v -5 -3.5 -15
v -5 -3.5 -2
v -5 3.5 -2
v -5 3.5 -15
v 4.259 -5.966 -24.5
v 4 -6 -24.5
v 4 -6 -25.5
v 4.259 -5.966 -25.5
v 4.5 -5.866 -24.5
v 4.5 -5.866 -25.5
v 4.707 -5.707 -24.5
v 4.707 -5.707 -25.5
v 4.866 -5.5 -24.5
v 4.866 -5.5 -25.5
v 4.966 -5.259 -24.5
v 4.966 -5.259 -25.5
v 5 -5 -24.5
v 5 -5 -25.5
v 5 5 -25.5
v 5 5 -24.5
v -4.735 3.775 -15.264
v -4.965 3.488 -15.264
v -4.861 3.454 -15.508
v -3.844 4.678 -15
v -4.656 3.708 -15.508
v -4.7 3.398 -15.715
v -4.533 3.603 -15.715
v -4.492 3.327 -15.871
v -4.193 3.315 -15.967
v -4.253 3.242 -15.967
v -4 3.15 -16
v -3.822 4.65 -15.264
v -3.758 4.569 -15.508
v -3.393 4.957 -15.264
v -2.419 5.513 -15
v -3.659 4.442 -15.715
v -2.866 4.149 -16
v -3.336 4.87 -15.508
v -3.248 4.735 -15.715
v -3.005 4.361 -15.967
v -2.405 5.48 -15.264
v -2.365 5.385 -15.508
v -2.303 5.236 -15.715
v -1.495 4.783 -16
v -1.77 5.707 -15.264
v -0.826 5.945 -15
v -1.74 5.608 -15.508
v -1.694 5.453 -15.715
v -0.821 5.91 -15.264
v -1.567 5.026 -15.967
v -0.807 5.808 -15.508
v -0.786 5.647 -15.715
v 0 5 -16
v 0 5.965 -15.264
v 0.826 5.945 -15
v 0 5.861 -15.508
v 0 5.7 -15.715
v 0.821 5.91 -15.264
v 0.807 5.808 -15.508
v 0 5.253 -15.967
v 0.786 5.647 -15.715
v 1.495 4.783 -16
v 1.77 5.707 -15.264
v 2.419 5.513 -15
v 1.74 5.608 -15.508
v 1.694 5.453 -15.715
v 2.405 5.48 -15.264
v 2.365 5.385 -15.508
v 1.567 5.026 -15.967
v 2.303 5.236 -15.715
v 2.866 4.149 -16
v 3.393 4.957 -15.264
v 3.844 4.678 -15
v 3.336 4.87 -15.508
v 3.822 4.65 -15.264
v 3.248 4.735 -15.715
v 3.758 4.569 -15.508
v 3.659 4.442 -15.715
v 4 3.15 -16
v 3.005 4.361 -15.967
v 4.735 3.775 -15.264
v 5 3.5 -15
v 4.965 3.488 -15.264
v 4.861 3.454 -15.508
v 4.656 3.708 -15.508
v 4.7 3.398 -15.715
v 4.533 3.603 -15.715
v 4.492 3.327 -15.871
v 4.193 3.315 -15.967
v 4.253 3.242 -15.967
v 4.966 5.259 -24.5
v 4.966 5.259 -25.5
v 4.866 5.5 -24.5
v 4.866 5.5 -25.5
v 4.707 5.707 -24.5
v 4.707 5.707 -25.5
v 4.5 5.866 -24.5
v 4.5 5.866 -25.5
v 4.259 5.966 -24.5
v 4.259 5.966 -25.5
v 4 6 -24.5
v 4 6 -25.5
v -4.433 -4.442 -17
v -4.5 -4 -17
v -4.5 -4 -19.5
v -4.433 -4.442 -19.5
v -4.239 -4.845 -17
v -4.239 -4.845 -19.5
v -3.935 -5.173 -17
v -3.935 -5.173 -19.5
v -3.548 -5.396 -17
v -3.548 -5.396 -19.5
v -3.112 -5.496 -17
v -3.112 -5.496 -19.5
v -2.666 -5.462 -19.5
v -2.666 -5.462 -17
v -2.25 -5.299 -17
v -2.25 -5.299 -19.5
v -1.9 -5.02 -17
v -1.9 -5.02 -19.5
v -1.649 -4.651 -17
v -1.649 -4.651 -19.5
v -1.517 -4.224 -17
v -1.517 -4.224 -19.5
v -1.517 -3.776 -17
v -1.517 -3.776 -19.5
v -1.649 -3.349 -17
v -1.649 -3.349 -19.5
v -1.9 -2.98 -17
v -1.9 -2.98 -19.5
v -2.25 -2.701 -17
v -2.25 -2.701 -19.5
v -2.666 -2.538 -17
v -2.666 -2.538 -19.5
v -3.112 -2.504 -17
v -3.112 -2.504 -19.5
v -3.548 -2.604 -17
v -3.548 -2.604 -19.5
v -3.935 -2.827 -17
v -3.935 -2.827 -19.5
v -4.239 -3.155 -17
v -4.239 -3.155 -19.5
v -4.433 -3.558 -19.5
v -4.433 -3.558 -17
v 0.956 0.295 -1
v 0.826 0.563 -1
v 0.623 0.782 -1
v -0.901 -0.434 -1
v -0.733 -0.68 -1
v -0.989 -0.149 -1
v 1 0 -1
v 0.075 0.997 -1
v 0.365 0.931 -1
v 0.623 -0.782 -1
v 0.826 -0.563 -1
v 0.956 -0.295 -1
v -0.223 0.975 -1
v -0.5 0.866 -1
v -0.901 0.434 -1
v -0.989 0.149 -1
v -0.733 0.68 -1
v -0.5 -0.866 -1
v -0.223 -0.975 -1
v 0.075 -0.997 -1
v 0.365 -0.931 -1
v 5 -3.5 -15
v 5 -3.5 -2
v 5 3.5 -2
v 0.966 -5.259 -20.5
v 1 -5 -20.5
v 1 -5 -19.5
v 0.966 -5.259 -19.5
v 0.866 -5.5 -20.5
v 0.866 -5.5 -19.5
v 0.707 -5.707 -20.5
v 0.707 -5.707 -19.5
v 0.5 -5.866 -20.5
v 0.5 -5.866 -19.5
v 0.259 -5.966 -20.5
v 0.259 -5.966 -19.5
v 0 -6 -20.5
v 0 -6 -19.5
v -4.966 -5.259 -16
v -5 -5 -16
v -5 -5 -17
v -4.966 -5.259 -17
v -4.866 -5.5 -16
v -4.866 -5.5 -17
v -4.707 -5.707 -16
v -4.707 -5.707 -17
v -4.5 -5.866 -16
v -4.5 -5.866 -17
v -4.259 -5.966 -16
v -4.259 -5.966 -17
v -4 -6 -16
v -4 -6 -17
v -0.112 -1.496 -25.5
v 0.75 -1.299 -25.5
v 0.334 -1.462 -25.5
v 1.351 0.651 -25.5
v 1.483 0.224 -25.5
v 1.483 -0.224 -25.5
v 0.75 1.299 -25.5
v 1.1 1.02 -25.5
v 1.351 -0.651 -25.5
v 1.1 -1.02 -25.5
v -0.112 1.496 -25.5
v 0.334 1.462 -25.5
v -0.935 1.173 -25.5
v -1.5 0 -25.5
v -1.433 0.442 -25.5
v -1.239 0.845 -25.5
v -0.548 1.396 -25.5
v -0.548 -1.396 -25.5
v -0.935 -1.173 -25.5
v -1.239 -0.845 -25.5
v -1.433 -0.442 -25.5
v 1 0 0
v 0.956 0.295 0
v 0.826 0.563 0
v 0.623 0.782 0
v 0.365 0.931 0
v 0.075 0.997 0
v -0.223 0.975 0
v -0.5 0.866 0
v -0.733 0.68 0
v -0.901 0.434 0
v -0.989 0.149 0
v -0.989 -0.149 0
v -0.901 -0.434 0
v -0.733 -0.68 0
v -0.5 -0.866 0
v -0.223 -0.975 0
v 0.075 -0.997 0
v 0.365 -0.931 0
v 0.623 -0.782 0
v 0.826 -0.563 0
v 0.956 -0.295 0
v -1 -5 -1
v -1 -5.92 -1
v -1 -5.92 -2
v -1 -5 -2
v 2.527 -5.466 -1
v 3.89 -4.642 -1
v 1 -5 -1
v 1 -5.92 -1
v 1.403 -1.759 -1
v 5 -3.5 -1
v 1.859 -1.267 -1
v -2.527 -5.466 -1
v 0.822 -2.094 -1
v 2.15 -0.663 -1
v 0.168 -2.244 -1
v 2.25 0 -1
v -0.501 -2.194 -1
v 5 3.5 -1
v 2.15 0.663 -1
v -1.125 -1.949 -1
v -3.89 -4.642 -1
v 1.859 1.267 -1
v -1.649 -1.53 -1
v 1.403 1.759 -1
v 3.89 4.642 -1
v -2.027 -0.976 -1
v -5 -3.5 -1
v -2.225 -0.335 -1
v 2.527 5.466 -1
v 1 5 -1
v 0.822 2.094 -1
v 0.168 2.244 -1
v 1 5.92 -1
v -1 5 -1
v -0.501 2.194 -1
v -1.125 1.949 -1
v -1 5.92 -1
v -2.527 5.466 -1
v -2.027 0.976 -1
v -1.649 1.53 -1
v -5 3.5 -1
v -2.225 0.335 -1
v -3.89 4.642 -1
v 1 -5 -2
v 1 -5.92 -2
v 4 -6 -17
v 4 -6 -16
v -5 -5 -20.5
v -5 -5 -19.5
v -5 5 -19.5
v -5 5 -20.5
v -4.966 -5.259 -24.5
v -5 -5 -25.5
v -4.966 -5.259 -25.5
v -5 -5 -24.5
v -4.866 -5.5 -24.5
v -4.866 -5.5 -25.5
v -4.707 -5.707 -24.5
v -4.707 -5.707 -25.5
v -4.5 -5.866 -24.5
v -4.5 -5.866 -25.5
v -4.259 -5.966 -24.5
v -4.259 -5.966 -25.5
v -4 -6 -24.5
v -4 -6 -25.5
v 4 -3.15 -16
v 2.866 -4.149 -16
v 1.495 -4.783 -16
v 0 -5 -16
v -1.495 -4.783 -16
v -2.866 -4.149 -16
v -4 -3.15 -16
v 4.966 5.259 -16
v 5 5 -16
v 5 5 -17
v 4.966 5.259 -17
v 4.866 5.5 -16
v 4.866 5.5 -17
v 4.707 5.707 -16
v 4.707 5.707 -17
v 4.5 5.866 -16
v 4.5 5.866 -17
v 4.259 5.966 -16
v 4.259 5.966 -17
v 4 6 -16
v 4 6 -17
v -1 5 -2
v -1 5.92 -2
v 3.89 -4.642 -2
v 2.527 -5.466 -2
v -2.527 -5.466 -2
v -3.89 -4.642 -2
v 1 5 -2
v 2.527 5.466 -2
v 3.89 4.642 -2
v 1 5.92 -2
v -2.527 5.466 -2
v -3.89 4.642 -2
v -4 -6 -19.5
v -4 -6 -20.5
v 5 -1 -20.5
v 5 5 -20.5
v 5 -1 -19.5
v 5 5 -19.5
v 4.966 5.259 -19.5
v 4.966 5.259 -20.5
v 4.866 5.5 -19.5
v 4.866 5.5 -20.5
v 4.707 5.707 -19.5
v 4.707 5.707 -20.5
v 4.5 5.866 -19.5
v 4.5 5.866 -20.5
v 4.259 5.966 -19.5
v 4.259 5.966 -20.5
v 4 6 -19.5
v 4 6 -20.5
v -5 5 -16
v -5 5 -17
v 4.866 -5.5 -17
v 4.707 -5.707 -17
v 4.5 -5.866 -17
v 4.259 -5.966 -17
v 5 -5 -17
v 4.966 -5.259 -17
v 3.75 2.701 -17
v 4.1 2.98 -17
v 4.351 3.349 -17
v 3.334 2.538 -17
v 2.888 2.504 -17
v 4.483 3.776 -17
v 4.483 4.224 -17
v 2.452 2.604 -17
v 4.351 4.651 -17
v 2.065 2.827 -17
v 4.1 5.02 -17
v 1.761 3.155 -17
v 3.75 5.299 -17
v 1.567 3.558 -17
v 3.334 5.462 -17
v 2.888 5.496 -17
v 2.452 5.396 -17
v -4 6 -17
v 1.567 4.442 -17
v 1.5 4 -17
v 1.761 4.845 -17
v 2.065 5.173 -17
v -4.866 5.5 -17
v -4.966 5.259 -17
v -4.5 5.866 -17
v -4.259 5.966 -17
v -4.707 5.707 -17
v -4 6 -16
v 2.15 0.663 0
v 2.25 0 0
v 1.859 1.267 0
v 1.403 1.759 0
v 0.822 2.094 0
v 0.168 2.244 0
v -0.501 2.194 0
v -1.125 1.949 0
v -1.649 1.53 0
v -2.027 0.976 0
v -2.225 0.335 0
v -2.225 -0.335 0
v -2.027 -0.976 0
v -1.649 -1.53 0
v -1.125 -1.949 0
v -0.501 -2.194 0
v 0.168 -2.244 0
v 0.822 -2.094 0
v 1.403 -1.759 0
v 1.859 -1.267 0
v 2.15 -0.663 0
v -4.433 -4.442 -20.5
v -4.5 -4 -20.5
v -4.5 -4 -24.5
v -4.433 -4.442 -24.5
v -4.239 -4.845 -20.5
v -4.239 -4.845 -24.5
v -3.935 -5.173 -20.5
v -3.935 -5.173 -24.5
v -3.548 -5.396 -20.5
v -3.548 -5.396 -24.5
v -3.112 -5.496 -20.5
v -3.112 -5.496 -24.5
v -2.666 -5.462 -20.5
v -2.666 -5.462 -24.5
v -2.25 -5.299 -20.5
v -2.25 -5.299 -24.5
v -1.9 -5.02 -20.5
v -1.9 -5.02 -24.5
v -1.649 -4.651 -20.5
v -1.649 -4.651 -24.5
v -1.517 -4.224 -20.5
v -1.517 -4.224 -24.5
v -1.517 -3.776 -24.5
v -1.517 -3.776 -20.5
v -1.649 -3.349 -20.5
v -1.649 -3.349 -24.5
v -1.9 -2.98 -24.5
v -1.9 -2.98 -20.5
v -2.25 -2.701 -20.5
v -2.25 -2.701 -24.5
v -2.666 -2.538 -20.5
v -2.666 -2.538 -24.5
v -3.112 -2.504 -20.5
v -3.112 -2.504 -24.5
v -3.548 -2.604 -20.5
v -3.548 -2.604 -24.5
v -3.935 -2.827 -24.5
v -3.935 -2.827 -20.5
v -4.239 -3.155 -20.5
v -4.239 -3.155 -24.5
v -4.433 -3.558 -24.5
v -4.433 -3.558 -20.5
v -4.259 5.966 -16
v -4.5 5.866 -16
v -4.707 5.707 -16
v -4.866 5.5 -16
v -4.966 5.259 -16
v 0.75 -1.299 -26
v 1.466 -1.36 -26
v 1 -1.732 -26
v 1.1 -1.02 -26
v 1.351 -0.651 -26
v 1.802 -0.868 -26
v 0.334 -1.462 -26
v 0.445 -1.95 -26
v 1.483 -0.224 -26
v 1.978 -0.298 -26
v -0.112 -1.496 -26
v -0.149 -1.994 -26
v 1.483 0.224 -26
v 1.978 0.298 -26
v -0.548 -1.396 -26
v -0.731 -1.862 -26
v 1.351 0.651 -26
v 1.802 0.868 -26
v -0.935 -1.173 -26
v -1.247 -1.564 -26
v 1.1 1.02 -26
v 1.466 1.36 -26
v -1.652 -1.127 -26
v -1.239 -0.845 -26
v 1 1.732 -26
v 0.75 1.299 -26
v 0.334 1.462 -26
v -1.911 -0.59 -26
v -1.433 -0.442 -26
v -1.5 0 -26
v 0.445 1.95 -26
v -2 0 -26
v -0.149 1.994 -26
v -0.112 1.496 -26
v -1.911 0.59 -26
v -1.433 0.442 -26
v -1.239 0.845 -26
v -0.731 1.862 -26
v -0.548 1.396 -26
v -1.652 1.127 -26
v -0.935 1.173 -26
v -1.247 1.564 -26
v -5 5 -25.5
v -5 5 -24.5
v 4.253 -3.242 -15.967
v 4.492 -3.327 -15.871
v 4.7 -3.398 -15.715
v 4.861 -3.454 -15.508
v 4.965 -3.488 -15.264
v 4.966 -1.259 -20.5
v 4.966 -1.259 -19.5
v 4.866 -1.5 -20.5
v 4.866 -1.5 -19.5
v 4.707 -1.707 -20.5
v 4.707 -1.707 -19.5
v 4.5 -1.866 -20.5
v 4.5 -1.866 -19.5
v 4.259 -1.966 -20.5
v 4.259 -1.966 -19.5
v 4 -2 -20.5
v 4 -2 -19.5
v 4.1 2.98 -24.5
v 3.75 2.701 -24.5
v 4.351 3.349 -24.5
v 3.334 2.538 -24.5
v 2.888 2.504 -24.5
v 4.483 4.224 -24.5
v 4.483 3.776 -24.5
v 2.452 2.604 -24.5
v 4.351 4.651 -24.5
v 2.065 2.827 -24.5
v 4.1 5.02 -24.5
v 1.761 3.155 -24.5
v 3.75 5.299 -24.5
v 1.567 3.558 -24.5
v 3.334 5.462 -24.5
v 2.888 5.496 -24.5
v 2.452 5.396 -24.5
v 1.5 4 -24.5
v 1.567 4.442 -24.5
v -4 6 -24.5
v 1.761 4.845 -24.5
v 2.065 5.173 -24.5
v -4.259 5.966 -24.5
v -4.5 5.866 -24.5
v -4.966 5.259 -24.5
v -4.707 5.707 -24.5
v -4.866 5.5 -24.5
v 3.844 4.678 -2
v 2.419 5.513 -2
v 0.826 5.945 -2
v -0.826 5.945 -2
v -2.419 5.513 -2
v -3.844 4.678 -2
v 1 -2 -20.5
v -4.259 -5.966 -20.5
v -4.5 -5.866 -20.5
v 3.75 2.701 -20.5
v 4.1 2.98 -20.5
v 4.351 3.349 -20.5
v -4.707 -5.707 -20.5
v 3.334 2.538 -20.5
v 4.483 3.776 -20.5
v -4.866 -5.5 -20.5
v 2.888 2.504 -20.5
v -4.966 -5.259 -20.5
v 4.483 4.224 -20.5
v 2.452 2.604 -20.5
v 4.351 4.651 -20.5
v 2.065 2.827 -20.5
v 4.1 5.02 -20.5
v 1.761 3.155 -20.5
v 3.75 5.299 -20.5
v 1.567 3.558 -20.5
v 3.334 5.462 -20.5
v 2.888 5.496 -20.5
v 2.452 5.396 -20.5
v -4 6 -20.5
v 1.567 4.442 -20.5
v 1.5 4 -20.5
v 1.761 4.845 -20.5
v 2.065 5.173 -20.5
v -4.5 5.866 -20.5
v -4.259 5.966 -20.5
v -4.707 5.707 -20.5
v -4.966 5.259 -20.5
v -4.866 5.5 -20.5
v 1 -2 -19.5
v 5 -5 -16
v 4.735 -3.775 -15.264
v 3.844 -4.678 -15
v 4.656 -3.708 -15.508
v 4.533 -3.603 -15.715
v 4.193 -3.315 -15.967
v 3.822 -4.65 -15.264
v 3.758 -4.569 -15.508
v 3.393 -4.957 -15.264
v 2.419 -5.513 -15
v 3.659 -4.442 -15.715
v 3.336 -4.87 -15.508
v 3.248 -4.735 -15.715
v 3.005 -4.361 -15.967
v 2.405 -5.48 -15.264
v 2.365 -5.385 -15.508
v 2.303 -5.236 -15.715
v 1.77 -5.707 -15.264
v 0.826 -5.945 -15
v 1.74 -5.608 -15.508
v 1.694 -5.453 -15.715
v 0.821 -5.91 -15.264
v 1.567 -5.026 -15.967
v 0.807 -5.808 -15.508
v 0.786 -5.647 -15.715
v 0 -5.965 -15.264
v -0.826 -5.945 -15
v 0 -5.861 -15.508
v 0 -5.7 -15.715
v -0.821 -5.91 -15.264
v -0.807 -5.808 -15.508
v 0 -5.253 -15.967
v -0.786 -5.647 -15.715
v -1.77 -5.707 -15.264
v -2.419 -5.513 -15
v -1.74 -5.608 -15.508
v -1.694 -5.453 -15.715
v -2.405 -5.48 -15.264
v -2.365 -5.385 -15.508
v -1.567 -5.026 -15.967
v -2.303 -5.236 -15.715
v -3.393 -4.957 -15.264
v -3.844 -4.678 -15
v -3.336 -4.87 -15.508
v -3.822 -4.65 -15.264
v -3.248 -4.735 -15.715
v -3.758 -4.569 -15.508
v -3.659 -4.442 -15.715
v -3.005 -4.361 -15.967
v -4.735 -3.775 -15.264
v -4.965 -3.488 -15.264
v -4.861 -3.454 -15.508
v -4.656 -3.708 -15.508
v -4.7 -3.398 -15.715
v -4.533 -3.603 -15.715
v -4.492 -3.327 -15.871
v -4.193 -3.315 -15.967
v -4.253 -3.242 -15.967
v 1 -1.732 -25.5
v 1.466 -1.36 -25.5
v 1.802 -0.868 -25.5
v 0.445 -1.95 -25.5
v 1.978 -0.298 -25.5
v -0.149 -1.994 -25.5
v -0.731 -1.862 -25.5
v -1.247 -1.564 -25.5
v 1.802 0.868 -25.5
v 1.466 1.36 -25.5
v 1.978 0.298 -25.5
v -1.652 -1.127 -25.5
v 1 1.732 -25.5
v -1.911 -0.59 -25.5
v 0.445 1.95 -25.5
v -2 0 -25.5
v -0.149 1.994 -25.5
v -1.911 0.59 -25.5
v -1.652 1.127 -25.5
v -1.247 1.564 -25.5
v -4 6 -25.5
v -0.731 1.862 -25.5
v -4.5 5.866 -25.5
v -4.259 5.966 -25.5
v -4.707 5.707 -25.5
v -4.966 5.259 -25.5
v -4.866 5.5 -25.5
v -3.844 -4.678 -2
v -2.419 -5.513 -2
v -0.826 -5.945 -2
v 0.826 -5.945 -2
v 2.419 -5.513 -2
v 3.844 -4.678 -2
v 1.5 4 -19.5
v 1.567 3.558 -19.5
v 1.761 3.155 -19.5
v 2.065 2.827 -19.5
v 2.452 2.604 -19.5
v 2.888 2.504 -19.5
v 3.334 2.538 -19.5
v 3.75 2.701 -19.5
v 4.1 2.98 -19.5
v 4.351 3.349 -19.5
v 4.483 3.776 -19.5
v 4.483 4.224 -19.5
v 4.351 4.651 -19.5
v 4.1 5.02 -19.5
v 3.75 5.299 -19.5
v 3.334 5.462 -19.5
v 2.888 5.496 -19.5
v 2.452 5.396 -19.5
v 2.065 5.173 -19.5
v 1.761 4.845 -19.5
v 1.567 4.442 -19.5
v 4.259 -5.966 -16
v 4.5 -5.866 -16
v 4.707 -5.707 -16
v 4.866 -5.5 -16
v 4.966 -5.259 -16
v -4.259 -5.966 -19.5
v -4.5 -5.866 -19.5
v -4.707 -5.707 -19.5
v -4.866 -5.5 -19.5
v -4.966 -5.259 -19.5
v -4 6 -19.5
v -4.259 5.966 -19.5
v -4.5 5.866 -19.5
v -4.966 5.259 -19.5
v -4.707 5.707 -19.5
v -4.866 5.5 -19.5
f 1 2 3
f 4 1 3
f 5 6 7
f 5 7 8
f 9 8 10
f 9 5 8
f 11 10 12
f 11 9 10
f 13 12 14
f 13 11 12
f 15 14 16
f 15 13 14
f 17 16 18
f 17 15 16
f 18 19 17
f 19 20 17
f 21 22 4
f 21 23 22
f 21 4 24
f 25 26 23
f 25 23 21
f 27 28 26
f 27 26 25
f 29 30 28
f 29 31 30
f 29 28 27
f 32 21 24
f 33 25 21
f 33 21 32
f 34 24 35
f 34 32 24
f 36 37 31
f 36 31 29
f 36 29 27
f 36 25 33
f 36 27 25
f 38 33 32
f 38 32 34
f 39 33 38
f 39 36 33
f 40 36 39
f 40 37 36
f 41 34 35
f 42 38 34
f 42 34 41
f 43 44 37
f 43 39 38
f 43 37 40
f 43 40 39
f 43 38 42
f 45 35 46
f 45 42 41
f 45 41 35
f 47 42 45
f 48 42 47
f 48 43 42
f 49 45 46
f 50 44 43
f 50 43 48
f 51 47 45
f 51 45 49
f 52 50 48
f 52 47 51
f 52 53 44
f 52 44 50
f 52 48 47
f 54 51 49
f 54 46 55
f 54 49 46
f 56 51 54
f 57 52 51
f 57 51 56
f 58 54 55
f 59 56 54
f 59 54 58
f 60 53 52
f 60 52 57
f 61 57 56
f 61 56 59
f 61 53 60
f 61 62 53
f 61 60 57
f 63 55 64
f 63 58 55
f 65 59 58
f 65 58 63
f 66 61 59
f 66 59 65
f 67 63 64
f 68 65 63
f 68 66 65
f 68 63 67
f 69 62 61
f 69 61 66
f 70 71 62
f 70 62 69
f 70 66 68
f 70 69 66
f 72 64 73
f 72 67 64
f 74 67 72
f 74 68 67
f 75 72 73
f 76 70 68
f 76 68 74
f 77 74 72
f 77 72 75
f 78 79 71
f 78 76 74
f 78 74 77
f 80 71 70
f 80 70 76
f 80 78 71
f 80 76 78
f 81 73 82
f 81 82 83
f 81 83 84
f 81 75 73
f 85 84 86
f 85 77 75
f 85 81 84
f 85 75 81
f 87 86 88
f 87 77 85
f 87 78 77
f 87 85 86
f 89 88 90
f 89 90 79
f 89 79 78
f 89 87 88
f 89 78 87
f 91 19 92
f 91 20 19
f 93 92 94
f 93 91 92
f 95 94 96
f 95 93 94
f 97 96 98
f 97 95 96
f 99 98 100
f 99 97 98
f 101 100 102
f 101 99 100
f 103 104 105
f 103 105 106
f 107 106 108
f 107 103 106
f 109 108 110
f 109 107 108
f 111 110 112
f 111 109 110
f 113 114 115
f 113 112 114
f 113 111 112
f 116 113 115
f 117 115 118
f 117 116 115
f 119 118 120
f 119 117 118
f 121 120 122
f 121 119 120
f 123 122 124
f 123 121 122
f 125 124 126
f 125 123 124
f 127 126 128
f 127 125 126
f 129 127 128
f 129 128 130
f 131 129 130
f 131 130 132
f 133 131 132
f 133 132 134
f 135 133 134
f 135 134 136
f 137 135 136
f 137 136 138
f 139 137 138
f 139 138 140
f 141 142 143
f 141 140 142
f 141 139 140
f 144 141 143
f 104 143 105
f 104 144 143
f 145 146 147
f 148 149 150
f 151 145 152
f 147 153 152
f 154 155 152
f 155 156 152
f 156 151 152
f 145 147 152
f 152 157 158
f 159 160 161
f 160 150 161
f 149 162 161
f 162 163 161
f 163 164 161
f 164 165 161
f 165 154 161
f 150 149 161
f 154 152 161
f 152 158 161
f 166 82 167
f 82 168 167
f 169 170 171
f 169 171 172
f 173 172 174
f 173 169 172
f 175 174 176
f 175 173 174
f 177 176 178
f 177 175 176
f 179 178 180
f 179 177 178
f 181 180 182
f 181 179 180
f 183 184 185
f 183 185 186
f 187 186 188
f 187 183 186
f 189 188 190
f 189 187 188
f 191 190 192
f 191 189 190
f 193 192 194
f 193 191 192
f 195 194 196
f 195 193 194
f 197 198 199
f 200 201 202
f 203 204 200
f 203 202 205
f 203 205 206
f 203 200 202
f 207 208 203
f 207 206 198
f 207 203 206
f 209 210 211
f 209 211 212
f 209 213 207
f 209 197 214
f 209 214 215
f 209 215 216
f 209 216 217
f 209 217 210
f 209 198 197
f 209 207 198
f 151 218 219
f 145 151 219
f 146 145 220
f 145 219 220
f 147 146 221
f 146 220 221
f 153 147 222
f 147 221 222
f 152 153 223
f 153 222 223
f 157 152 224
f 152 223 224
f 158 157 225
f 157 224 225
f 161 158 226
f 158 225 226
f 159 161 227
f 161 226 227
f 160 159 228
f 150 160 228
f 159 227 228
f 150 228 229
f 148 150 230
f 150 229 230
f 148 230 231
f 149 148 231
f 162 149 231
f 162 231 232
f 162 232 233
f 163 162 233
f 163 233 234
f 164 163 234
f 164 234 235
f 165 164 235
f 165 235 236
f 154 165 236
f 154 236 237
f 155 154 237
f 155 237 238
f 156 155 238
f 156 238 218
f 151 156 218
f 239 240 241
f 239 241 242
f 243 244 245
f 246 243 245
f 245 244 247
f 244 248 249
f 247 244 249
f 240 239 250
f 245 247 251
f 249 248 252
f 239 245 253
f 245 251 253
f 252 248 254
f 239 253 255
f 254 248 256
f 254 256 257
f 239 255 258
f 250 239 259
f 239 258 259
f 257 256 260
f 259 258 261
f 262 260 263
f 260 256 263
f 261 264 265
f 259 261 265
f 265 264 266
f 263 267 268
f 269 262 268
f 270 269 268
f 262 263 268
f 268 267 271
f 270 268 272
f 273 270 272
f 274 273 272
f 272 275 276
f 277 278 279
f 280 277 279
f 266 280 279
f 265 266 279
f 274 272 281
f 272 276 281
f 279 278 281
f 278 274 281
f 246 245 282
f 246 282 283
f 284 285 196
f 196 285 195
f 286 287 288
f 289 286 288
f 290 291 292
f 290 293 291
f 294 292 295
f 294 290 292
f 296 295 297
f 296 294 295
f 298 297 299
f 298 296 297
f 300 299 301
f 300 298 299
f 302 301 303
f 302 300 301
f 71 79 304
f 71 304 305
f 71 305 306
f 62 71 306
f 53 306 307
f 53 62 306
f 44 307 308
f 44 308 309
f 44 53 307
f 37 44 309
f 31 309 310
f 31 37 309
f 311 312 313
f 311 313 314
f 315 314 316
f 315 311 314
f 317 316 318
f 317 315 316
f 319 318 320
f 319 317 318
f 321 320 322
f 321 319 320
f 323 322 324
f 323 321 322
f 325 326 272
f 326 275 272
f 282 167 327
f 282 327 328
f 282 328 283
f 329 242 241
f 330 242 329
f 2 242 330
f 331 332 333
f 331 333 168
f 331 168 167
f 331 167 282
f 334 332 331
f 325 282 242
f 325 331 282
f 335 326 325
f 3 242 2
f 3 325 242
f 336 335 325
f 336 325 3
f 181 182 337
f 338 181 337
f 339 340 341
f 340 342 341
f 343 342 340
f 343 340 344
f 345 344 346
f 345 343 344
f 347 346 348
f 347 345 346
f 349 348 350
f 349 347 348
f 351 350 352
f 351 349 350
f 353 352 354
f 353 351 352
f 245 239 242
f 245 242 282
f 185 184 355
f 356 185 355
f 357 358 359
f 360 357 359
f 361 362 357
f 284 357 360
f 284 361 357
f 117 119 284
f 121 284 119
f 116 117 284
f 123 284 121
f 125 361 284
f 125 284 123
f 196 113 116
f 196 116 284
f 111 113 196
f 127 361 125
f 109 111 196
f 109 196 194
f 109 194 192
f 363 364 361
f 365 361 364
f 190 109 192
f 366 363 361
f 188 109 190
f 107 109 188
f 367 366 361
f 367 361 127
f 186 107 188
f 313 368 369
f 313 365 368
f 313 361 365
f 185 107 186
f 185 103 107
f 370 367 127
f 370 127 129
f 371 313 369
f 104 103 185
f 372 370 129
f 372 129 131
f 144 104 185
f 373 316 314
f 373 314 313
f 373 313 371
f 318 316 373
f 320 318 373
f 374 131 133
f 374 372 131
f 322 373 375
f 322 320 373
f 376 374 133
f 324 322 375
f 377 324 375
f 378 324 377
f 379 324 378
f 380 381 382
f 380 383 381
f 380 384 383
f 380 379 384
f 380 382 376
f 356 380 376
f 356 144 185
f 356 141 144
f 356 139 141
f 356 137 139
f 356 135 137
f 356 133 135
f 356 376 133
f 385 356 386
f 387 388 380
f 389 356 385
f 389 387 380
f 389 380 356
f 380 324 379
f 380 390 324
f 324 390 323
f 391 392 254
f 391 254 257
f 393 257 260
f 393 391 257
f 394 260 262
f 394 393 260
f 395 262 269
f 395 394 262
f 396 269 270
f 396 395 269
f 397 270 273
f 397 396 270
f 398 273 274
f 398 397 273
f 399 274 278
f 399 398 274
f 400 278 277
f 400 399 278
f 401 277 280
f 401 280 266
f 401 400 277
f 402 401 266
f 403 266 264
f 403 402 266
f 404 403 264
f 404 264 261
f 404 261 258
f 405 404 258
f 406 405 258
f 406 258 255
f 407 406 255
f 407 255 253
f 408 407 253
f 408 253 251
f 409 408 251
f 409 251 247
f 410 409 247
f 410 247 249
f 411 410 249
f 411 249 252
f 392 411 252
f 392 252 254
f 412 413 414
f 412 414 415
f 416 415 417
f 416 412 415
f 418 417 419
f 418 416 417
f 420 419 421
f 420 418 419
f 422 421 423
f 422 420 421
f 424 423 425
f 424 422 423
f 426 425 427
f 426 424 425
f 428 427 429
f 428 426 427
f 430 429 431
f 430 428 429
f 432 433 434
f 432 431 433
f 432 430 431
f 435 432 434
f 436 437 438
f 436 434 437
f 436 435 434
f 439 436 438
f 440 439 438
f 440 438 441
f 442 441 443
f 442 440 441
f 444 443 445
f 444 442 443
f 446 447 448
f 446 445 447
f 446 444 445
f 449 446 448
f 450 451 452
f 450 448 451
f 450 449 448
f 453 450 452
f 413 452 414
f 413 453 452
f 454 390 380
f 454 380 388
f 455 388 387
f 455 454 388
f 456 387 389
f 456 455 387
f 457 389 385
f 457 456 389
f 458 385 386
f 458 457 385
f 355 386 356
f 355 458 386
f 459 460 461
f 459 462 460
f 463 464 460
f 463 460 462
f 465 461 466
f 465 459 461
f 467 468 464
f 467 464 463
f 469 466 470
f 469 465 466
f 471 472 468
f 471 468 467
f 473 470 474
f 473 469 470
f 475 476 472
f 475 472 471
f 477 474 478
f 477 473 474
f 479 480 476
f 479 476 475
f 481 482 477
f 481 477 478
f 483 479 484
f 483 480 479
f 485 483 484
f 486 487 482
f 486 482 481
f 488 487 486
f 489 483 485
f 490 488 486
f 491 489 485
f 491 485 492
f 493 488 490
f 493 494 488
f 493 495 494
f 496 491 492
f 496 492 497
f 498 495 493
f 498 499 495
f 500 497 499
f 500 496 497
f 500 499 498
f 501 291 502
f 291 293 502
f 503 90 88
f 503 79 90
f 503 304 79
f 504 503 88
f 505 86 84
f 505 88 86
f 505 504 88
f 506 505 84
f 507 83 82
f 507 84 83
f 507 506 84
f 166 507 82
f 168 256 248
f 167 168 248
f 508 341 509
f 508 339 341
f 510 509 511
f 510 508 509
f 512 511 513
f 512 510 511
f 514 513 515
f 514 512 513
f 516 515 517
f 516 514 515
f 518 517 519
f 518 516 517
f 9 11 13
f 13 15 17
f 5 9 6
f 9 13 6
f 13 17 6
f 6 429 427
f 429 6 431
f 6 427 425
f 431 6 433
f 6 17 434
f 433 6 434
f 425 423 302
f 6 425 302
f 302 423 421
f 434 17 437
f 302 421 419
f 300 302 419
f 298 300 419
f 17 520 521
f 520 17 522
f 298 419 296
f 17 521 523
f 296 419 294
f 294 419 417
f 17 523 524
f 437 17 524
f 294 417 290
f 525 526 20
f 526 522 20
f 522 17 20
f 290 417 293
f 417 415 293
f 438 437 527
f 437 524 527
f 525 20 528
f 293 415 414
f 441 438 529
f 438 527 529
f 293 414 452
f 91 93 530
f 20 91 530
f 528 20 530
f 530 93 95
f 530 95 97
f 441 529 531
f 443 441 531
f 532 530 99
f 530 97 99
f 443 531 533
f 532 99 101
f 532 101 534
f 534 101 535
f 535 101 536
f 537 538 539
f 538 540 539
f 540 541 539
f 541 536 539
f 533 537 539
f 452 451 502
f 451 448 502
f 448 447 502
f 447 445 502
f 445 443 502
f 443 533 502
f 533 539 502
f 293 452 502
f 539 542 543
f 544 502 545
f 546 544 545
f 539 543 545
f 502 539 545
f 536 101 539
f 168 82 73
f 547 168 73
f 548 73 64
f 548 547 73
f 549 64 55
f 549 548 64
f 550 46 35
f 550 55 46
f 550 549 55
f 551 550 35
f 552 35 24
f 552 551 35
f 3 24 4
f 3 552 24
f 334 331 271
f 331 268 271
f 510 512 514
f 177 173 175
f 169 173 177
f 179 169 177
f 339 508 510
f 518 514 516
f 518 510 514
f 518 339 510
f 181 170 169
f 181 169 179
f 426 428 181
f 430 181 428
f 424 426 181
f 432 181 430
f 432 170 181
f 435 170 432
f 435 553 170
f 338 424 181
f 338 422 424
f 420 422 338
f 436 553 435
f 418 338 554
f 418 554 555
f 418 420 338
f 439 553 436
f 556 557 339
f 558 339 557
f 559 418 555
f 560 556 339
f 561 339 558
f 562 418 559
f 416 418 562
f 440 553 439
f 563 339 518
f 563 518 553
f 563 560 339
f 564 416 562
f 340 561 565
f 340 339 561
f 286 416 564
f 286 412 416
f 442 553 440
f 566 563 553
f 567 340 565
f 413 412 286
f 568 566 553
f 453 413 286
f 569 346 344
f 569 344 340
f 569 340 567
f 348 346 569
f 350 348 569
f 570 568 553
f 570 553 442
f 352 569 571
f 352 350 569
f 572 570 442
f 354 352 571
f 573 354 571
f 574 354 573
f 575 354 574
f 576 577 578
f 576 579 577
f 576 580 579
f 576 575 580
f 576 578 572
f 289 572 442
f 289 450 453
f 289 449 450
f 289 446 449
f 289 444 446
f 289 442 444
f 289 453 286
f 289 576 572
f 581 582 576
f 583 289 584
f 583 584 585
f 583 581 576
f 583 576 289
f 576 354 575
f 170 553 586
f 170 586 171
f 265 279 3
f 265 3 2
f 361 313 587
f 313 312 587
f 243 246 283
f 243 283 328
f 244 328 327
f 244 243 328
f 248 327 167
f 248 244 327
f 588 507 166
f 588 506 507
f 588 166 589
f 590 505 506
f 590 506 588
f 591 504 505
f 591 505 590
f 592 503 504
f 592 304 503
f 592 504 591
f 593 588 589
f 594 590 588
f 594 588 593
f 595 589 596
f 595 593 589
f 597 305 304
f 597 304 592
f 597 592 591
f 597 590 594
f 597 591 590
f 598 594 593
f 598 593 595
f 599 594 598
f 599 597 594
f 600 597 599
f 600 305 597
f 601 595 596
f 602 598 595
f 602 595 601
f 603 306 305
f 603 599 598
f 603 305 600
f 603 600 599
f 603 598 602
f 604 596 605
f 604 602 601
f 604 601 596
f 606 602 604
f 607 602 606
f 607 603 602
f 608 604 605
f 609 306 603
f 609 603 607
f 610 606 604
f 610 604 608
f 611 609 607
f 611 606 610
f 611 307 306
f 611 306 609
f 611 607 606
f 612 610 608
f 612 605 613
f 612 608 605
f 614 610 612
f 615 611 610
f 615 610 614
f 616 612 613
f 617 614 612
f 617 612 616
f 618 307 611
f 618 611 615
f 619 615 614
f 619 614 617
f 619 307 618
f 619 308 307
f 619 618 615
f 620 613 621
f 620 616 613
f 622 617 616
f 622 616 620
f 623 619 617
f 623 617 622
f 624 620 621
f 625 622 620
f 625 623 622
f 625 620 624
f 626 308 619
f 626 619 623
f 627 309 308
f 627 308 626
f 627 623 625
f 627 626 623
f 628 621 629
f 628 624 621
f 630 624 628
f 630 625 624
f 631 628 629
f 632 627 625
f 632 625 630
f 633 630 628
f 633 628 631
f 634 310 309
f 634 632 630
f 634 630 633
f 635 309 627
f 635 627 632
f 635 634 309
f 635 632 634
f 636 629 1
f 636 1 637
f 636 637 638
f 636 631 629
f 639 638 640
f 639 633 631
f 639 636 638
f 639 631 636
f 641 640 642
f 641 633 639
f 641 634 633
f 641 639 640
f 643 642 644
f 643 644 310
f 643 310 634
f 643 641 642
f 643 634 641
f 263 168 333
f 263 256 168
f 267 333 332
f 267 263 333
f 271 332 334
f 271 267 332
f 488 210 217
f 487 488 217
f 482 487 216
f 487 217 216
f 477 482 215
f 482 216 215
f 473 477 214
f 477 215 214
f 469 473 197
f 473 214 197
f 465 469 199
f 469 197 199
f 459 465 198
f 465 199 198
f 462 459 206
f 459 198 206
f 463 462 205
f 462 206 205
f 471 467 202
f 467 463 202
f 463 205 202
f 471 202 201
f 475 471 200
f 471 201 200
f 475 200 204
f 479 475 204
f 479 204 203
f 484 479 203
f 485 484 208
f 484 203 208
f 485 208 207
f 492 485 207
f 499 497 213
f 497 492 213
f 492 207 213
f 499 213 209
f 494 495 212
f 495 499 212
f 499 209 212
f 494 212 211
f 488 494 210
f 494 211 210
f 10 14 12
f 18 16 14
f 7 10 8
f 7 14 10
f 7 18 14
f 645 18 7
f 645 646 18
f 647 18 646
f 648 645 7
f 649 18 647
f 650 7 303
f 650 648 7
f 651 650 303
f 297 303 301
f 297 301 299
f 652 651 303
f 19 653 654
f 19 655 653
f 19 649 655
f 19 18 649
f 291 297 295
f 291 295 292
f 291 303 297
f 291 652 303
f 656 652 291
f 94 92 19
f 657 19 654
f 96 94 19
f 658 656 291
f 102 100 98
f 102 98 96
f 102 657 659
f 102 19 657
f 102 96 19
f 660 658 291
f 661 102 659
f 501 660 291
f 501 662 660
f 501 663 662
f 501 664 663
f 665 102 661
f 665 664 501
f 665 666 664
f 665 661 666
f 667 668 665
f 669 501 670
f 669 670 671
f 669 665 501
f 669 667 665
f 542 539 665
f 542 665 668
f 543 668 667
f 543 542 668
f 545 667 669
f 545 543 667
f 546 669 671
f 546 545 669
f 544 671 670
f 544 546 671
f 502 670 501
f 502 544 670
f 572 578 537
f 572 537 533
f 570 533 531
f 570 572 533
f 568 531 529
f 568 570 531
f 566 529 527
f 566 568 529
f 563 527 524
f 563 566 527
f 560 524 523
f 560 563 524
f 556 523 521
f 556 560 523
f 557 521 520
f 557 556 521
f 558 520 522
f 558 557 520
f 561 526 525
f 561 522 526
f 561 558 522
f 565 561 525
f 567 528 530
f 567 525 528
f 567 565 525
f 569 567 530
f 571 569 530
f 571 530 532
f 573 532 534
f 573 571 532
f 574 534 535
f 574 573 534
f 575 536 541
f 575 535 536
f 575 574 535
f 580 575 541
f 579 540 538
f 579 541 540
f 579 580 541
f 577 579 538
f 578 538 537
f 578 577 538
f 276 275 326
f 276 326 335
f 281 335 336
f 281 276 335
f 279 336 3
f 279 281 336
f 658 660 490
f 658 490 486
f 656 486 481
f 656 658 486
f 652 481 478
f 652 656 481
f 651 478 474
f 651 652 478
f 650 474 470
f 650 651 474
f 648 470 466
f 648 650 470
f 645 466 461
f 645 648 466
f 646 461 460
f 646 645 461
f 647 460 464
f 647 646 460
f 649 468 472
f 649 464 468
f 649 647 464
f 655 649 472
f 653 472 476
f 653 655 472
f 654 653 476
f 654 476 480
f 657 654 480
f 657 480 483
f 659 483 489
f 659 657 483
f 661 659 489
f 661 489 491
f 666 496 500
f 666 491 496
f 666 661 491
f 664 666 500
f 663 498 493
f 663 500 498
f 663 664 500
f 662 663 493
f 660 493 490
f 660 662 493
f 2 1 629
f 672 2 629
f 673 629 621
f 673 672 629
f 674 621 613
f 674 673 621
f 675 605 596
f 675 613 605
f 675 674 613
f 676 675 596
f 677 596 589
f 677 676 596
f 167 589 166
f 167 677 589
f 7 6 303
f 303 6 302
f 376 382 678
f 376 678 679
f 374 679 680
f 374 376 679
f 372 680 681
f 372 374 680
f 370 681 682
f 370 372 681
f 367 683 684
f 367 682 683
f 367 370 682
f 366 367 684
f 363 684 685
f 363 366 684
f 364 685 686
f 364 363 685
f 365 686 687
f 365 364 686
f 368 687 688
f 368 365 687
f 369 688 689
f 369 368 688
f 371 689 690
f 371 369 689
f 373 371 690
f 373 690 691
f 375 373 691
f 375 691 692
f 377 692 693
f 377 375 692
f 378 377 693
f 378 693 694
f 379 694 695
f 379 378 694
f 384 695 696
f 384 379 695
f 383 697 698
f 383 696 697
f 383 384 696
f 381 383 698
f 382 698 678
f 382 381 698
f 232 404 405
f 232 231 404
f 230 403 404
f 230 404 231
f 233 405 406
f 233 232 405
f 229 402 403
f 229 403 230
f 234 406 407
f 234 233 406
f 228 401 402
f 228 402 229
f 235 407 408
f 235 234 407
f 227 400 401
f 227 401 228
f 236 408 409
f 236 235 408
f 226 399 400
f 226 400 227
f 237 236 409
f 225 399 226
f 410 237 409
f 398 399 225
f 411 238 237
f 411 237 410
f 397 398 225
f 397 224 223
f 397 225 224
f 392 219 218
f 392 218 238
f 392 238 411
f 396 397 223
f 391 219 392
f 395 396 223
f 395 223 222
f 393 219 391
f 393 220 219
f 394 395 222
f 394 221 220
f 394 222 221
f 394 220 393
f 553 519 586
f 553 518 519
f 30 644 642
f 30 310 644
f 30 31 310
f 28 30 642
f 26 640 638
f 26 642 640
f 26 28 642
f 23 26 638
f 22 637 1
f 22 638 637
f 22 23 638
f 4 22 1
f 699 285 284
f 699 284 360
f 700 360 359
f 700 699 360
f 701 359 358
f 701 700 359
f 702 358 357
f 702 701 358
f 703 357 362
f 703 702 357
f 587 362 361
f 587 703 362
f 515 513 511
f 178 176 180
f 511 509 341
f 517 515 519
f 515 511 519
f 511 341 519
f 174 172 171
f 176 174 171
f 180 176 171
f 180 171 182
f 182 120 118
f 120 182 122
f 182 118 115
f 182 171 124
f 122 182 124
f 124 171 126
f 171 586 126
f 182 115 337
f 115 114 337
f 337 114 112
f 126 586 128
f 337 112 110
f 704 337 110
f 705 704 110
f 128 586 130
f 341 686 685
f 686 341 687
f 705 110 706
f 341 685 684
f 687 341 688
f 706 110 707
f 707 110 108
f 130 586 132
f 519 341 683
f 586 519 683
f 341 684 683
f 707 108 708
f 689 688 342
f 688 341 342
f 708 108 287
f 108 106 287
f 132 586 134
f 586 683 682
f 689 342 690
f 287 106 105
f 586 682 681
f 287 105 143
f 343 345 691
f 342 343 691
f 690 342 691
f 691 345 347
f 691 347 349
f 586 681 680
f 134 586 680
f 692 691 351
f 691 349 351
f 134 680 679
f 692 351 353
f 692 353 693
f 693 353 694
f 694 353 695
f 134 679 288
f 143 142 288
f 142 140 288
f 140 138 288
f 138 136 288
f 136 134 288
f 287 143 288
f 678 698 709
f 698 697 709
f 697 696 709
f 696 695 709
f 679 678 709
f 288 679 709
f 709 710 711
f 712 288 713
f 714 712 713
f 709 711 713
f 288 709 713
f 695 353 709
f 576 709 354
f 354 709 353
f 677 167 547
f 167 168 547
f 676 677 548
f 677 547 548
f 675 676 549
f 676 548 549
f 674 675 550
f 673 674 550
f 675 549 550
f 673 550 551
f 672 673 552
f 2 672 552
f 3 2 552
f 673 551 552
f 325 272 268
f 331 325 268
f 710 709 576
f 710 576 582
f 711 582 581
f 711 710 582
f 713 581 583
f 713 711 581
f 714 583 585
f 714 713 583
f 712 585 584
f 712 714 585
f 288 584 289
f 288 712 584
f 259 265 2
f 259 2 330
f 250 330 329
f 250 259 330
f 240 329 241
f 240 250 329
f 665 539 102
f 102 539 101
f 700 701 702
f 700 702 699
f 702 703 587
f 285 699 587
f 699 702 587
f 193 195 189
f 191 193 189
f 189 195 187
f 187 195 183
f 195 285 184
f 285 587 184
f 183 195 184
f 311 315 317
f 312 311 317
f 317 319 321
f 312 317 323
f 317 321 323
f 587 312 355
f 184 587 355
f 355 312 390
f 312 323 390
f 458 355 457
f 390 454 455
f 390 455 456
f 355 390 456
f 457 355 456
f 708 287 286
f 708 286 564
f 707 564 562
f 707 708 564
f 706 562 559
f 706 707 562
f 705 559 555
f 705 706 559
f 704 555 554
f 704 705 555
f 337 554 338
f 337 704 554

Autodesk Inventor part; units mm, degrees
ref_plane "YZ Plane" through (0, 0, 0) normal (1, 0, 0) x (0, 1, 0)
ref_plane "XZ Plane" through (0, 0, 0) normal (0, 1, 0) x (-1, 0, 0)
ref_plane "XY Plane" through (0, 0, 0) normal (0, 0, 1) x (1, 0, 0)
sketch "草图1" plane through (0, 0, 0) normal (0, 0, 1) x (1, 0, 0)
  circle A0 centre (0, 0) radius 2.25
  circle A1 centre (0, 0) radius 1
  dimension "d0" = 4.5
  dimension "d1" = 2
extrude "拉伸1" add sketch "草图1" against normal blind 1
sketch "草图2" plane through (0, 0, -1) normal (0, 0, -1) x (-1, 0, 0)
  line L0 (5, 3.5) -> (5, -3.5)
  line L1 (-5, 3.5) -> (-5, -3.5)
  line L2 (5, -3.5) -> (-5, -3.5) construction
  line L3 (5, 3.5) -> (-5, 3.5) construction
  line L4 (0, 0) -> (0, 19.9498)
  line L5 (0, 0) -> (7.1401, 0)
  line L6 (1, 5.9195) -> (1, 5)
  line L7 (1, 5) -> (-1, 5)
  line L8 (-1, 5) -> (-1, 5.9195)
  arc A0 (5, 3.5) -> (1, 5.9195) centre (0, -0.25) ccw
  arc A1 (-1, 5.9195) -> (-5, 3.5) centre (0, -0.25) ccw
  line L9 (1, -5.9195) -> (1, -5)
  line L10 (1, -5) -> (-1, -5)
  line L11 (-1, -5) -> (-1, -5.9195)
  arc A2 (-5, -3.5) -> (-1, -5.9195) centre (0, 0.25) ccw
  arc A3 (1, -5.9195) -> (5, -3.5) centre (0, 0.25) ccw
  point P0 (0, 6)
  point P1 (0, 6)
  dimension "d4" = 10
  dimension "d7" = 7
  dimension "d8" = 6
  dimension "d9" = 1
  dimension "d10" = 2
extrude "拉伸2" add sketch "草图2" along normal blind 1
sketch "草图3" plane through (0, 0, -2) normal (0, 0, -1) x (-1, 0, 0)
  line L0 (1, 5) -> (-1, 5) construction
  line L1 (-1, 5) -> (-1, 5.9195) construction
  arc A0 (-1, 5.9195) -> (-5, 3.5) centre (0, -0.25) ccw construction
  line L2 (-5, 3.5) -> (-5, -3.5) projected
  arc A1 (-5, -3.5) -> (-1, -5.9195) centre (0, 0.25) ccw construction
  line L3 (-1, -5.9195) -> (-1, -5) construction
  line L4 (-1, -5) -> (1, -5) construction
  line L5 (1, -5) -> (1, -5.9195) construction
  arc A2 (1, -5.9195) -> (5, -3.5) centre (0, 0.25) ccw construction
  line L6 (5, -3.5) -> (5, 3.5) projected
  arc A3 (5, 3.5) -> (1, 5.9195) centre (0, -0.25) ccw construction
  line L7 (1, 5.9195) -> (1, 5) construction
  arc A4 (5, 3.5) -> (-5, 3.5) centre (0, -0.25) ccw
  line L8 (0, 0) -> (3.3982, 0)
  arc A5 (-5, -3.5) -> (5, -3.5) centre (0, 0.25) ccw
extrude "拉伸3" add sketch "草图3" along normal blind 14 separate body
fillet "圆角1" radius 1 4 edges at (0, 6, -16) (-5, 0, -16) (0, -6, -16) (5, 0, -16)
sketch "草图4" plane through (0, 0, -16) normal (0, 0, -1) x (-1, 0, 0)
  line L0 (-5, 5) -> (-5, -5)
  line L1 (-4, -6) -> (4, -6)
  line L2 (5, -5) -> (5, 5)
  line L3 (4, 6) -> (-4, 6)
  line L4 (0, 0) -> (0, 19.5528)
  line L5 (0, 0) -> (-9.7016, 0)
  arc A0 (-5, -5) -> (-4, -6) centre (-4, -5) ccw
  arc A1 (-4, 6) -> (-5, 5) centre (-4, 5) ccw
  arc A2 (5, 5) -> (4, 6) centre (4, 5) ccw
  arc A3 (4, -6) -> (5, -5) centre (4, -5) ccw
  dimension "d16" = 1
  dimension "d17" = 10
  dimension "d18" = 12
extrude "拉伸4" add sketch "草图4" along normal blind 1 separate body
sketch "草图5" plane through (0, 0, -17) normal (0, 0, -1) x (-1, 0, 0)
  circle A0 centre (3, -4) radius 1.5
  circle A1 centre (-3, 4) radius 1.5
  line L0 (5, -5) -> (5, 5) projected
  line L1 (-4, -6) -> (4, -6) projected
  line L2 (4, 6) -> (-4, 6) projected
  line L3 (-5, 5) -> (-5, -5) projected
  point P0 (0, 0)
  dimension "d21" = 3
  dimension "d22" = 2
  dimension "d23" = 2
  dimension "d24" = 2
  dimension "d25" = 2
extrude "拉伸5" add sketch "草图5" along normal blind 2.5 bodies 3
sketch "草图6" plane through (-3, -4, -19.5) normal (0, 0, -1) x (-1, 0, 0)
  circle A0 centre (-6, 8) radius 1.5 construction
  circle A1 centre (0, 0) radius 1.5 construction
  line L0 (-8, 9) -> (-8, -1) projected
  arc A2 (-8, -1) -> (-7, -2) centre (-7, -1) ccw projected
  line L1 (-7, -2) -> (1, -2) projected
  arc A3 (1, -2) -> (2, -1) centre (1, -1) ccw projected
  line L2 (2, -1) -> (2, 9) projected
  arc A4 (2, 9) -> (1, 10) centre (1, 9) ccw projected
  line L3 (1, 10) -> (-7, 10) projected
  arc A5 (-7, 10) -> (-8, 9) centre (-7, 9) ccw projected
  point P0 (-3, 4)
extrude "拉伸6" add sketch "草图6" along normal blind 1 bodies 3
sketch "草图7" plane through (-3, -4, -20.5) normal (0, 0, -1) x (-1, 0, 0)
  circle A0 centre (0, 0) radius 1.5 projected
  circle A1 centre (-6, 8) radius 1.5 projected
  point P0 (-3, 4)
extrude "拉伸7" add sketch "草图7" along normal blind 4 bodies 3
sketch "草图8" plane through (-3, -4, -24.5) normal (0, 0, -1) x (-1, 0, 0)
  circle A0 centre (-6, 8) radius 1.5 construction
  circle A1 centre (0, 0) radius 1.5 construction
  arc A2 (-8, -1) -> (-7, -2) centre (-7, -1) ccw projected
  line L0 (-7, -2) -> (1, -2) projected
  arc A3 (1, -2) -> (2, -1) centre (1, -1) ccw projected
  line L1 (2, -1) -> (2, 9) projected
  arc A4 (2, 9) -> (1, 10) centre (1, 9) ccw projected
  line L2 (1, 10) -> (-7, 10) projected
  arc A5 (-7, 10) -> (-8, 9) centre (-7, 9) ccw projected
  line L3 (-8, 9) -> (-8, -1) projected
  point P0 (-3, 4)
extrude "拉伸8" add sketch "草图8" along normal blind 1 bodies 3
sketch "草图9" plane through (-3, -4, -25.5) normal (0, 0, -1) x (-1, 0, 0)
  circle A0 centre (-3, 4) radius 1 projected
  circle A1 centre (-3, 4) radius 2
  circle A2 centre (-3, 4) radius 1.5
  dimension "d34" = 4
  dimension "d35" = 3
extrude "拉伸9" add sketch "草图9" along normal blind 0.5 contours A1 bodies 3
sketch "草图11" plane through (-3, -4, -20.5) normal (0, 0, -1) x (-1, 0, 0)
  line L0 (-7, 2) -> (-4, 2)
  line L1 (-4, 2) -> (-4, -1)
  line L2 (-7, -2) -> (1, -2) construction
  line L3 (-7, -2) -> (1, -2) projected
  arc A0 (-4, -1) -> (-3, -2) centre (-3, -1) ccw
  arc A1 (-8, 3) -> (-7, 2) centre (-7, 3) ccw
  arc A2 (-8, -1) -> (-7, -2) centre (-7, -1) ccw projected
  line L4 (-3, -2) -> (-7, -2)
  arc A3 (-8, 0.5) -> (2, 0.5) centre (-3, 4.25) ccw construction
  line L5 (-8, 9) -> (-8, -1) construction
  line L6 (-8, 3) -> (-8, -1)
  point P0 (-3, 4)
  point P1 (-8, 2)
  point P2 (-4, -2)
  dimension "d45" = 4
  dimension "d46" = 1
  dimension "d47" = 1
extrude "拉伸12" cut sketch "草图11" against normal blind 1.5 bodies 3
properties part number "GA12-N20微型减速直流电机3V_15RPM"
